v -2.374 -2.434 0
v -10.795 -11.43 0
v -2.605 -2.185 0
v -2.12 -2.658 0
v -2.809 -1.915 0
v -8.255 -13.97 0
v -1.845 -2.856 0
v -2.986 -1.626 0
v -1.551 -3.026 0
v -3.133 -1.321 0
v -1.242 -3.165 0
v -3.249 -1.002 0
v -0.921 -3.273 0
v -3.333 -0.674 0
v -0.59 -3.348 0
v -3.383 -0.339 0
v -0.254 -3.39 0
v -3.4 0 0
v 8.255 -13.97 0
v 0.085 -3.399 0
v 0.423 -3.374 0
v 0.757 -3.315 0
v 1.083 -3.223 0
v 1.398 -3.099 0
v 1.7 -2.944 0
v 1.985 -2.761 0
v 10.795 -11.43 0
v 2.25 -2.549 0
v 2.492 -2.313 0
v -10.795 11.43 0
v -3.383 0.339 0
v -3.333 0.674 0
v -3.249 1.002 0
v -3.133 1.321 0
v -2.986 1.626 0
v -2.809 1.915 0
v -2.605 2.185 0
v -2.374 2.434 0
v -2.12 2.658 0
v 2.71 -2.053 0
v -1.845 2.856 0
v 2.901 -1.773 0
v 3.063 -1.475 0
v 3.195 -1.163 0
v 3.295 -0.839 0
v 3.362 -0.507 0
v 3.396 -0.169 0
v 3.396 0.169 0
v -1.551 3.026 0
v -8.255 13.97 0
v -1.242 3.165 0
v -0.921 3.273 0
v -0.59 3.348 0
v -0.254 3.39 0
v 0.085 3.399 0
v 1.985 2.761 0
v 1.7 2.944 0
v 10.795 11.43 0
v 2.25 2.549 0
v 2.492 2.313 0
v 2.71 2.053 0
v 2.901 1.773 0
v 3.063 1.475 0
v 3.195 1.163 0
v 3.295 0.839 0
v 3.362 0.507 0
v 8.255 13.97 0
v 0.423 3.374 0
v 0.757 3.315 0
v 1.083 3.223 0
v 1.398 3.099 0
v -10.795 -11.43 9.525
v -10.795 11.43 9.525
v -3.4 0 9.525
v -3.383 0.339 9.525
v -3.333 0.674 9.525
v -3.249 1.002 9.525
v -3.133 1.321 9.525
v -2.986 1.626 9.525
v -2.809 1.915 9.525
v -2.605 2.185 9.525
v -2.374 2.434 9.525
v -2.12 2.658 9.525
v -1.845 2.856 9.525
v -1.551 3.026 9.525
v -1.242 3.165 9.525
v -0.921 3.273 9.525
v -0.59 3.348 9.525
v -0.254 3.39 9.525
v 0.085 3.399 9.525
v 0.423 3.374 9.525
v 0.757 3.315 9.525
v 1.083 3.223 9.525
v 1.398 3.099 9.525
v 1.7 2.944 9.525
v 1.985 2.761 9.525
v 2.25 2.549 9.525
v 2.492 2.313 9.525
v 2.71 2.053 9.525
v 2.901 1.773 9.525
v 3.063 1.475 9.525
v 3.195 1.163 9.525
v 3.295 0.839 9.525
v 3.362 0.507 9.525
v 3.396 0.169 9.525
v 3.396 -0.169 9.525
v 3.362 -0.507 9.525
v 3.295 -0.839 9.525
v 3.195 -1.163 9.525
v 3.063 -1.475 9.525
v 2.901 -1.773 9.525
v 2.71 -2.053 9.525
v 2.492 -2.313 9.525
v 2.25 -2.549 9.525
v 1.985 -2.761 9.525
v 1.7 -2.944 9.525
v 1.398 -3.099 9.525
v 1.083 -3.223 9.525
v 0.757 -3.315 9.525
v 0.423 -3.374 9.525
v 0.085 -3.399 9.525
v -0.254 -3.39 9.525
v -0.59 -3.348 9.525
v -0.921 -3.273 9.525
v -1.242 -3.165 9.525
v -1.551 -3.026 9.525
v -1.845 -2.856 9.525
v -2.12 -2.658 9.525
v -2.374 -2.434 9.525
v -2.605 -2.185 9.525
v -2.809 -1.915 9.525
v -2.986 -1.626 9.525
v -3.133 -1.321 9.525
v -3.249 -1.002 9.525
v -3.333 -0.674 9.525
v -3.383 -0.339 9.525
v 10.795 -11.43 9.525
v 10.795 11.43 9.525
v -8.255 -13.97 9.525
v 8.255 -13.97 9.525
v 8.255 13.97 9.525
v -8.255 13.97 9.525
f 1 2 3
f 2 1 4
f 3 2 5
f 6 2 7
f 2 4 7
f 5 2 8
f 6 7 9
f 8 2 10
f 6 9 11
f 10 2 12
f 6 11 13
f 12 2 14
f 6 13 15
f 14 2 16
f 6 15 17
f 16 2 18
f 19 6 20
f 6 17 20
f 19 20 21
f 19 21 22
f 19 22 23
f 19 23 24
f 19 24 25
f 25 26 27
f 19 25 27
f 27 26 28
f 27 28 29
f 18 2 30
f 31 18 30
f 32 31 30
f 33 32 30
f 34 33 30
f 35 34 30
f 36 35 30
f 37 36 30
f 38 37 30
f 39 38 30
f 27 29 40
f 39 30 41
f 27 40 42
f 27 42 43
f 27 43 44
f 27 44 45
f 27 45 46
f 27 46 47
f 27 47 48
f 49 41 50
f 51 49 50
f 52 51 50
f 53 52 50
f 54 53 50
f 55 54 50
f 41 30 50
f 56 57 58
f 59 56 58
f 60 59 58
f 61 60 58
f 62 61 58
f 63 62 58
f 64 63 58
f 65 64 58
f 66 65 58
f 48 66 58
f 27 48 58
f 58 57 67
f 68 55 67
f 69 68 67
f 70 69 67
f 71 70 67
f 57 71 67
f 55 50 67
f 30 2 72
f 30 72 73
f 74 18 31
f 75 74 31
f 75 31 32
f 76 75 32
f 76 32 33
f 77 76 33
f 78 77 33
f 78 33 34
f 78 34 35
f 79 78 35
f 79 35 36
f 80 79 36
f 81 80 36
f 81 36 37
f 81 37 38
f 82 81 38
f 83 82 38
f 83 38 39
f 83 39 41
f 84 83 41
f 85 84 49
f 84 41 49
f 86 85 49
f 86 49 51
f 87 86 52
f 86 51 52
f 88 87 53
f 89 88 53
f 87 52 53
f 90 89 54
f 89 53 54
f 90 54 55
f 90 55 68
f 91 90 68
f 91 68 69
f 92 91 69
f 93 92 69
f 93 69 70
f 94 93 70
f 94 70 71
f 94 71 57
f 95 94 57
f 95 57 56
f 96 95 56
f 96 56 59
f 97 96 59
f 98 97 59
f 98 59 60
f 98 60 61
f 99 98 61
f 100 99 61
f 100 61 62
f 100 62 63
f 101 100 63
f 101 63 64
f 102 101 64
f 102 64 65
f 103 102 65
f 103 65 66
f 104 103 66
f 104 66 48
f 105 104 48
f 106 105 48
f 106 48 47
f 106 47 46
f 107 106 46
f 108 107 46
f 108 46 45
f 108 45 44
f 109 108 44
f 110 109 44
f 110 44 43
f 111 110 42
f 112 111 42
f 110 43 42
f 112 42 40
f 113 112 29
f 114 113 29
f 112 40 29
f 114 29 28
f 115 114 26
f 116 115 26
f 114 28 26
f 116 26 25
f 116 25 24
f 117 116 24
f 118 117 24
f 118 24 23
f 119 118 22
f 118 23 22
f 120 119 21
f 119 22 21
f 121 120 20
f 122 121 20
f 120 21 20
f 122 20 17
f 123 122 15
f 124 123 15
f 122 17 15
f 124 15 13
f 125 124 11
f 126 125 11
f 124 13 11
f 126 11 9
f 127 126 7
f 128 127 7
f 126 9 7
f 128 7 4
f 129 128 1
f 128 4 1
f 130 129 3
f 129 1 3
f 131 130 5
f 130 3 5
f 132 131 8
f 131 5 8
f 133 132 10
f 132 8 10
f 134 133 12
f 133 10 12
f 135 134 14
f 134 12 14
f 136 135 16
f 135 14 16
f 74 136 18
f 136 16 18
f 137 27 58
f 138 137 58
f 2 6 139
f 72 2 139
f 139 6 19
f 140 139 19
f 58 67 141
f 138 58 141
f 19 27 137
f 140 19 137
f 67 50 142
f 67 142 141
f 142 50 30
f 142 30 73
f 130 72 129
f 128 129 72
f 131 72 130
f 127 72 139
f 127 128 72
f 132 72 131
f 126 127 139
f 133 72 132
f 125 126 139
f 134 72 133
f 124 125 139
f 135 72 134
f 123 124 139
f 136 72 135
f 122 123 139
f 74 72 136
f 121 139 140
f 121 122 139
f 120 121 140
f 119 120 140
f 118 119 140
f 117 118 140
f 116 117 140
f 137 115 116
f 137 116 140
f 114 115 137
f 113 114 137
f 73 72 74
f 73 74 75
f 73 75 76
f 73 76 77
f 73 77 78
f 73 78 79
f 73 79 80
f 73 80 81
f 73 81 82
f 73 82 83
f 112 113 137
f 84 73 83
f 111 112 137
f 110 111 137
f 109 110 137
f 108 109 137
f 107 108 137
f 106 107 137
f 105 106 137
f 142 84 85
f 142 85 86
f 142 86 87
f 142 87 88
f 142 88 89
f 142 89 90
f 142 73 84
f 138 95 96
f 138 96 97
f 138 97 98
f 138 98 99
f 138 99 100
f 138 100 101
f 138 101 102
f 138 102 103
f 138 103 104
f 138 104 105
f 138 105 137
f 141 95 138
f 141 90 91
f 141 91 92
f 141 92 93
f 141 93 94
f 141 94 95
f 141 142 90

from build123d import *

# Parameters (mm, degrees)
F0_W     = 21.59
F0_H     = 27.94
F1_DEPTH = 9.525
F2_SIZE2 = 2.54
F2_SIZE  = 2.54
F3_R     = 3.302
F4_DEPTH = 9.526
F6_D     = 6.8


with BuildPart() as f1:
    # F0 (on Top) → F1 (new body)
    with BuildSketch(Plane.XY):
        Rectangle(F0_W, F0_H)
    extrude(amount=F1_DEPTH)

    # F2
    f2_edges = [f1.edges().sort_by_distance(p)[0] for p in [
        (-10.795, 13.97, 4.7625),
        (-10.795, -13.97, 4.7625),
        (10.795, -13.97, 4.7625),
        (10.795, 13.97, 4.7625),
    ]]
    chamfer(f2_edges, length=F2_SIZE, length2=F2_SIZE2)

    # F3 (on face) → F4 (cut, through all)
    with BuildSketch(Plane.XY.offset(9.525)):
        Circle(F3_R)
    extrude(amount=-F4_DEPTH, mode=Mode.SUBTRACT)

    # F6 (through all)
    with Locations(Plane.XY.offset(9.525)):
        with Locations((0, 0)):
            Hole(F6_D / 2)


solid = f1.part
